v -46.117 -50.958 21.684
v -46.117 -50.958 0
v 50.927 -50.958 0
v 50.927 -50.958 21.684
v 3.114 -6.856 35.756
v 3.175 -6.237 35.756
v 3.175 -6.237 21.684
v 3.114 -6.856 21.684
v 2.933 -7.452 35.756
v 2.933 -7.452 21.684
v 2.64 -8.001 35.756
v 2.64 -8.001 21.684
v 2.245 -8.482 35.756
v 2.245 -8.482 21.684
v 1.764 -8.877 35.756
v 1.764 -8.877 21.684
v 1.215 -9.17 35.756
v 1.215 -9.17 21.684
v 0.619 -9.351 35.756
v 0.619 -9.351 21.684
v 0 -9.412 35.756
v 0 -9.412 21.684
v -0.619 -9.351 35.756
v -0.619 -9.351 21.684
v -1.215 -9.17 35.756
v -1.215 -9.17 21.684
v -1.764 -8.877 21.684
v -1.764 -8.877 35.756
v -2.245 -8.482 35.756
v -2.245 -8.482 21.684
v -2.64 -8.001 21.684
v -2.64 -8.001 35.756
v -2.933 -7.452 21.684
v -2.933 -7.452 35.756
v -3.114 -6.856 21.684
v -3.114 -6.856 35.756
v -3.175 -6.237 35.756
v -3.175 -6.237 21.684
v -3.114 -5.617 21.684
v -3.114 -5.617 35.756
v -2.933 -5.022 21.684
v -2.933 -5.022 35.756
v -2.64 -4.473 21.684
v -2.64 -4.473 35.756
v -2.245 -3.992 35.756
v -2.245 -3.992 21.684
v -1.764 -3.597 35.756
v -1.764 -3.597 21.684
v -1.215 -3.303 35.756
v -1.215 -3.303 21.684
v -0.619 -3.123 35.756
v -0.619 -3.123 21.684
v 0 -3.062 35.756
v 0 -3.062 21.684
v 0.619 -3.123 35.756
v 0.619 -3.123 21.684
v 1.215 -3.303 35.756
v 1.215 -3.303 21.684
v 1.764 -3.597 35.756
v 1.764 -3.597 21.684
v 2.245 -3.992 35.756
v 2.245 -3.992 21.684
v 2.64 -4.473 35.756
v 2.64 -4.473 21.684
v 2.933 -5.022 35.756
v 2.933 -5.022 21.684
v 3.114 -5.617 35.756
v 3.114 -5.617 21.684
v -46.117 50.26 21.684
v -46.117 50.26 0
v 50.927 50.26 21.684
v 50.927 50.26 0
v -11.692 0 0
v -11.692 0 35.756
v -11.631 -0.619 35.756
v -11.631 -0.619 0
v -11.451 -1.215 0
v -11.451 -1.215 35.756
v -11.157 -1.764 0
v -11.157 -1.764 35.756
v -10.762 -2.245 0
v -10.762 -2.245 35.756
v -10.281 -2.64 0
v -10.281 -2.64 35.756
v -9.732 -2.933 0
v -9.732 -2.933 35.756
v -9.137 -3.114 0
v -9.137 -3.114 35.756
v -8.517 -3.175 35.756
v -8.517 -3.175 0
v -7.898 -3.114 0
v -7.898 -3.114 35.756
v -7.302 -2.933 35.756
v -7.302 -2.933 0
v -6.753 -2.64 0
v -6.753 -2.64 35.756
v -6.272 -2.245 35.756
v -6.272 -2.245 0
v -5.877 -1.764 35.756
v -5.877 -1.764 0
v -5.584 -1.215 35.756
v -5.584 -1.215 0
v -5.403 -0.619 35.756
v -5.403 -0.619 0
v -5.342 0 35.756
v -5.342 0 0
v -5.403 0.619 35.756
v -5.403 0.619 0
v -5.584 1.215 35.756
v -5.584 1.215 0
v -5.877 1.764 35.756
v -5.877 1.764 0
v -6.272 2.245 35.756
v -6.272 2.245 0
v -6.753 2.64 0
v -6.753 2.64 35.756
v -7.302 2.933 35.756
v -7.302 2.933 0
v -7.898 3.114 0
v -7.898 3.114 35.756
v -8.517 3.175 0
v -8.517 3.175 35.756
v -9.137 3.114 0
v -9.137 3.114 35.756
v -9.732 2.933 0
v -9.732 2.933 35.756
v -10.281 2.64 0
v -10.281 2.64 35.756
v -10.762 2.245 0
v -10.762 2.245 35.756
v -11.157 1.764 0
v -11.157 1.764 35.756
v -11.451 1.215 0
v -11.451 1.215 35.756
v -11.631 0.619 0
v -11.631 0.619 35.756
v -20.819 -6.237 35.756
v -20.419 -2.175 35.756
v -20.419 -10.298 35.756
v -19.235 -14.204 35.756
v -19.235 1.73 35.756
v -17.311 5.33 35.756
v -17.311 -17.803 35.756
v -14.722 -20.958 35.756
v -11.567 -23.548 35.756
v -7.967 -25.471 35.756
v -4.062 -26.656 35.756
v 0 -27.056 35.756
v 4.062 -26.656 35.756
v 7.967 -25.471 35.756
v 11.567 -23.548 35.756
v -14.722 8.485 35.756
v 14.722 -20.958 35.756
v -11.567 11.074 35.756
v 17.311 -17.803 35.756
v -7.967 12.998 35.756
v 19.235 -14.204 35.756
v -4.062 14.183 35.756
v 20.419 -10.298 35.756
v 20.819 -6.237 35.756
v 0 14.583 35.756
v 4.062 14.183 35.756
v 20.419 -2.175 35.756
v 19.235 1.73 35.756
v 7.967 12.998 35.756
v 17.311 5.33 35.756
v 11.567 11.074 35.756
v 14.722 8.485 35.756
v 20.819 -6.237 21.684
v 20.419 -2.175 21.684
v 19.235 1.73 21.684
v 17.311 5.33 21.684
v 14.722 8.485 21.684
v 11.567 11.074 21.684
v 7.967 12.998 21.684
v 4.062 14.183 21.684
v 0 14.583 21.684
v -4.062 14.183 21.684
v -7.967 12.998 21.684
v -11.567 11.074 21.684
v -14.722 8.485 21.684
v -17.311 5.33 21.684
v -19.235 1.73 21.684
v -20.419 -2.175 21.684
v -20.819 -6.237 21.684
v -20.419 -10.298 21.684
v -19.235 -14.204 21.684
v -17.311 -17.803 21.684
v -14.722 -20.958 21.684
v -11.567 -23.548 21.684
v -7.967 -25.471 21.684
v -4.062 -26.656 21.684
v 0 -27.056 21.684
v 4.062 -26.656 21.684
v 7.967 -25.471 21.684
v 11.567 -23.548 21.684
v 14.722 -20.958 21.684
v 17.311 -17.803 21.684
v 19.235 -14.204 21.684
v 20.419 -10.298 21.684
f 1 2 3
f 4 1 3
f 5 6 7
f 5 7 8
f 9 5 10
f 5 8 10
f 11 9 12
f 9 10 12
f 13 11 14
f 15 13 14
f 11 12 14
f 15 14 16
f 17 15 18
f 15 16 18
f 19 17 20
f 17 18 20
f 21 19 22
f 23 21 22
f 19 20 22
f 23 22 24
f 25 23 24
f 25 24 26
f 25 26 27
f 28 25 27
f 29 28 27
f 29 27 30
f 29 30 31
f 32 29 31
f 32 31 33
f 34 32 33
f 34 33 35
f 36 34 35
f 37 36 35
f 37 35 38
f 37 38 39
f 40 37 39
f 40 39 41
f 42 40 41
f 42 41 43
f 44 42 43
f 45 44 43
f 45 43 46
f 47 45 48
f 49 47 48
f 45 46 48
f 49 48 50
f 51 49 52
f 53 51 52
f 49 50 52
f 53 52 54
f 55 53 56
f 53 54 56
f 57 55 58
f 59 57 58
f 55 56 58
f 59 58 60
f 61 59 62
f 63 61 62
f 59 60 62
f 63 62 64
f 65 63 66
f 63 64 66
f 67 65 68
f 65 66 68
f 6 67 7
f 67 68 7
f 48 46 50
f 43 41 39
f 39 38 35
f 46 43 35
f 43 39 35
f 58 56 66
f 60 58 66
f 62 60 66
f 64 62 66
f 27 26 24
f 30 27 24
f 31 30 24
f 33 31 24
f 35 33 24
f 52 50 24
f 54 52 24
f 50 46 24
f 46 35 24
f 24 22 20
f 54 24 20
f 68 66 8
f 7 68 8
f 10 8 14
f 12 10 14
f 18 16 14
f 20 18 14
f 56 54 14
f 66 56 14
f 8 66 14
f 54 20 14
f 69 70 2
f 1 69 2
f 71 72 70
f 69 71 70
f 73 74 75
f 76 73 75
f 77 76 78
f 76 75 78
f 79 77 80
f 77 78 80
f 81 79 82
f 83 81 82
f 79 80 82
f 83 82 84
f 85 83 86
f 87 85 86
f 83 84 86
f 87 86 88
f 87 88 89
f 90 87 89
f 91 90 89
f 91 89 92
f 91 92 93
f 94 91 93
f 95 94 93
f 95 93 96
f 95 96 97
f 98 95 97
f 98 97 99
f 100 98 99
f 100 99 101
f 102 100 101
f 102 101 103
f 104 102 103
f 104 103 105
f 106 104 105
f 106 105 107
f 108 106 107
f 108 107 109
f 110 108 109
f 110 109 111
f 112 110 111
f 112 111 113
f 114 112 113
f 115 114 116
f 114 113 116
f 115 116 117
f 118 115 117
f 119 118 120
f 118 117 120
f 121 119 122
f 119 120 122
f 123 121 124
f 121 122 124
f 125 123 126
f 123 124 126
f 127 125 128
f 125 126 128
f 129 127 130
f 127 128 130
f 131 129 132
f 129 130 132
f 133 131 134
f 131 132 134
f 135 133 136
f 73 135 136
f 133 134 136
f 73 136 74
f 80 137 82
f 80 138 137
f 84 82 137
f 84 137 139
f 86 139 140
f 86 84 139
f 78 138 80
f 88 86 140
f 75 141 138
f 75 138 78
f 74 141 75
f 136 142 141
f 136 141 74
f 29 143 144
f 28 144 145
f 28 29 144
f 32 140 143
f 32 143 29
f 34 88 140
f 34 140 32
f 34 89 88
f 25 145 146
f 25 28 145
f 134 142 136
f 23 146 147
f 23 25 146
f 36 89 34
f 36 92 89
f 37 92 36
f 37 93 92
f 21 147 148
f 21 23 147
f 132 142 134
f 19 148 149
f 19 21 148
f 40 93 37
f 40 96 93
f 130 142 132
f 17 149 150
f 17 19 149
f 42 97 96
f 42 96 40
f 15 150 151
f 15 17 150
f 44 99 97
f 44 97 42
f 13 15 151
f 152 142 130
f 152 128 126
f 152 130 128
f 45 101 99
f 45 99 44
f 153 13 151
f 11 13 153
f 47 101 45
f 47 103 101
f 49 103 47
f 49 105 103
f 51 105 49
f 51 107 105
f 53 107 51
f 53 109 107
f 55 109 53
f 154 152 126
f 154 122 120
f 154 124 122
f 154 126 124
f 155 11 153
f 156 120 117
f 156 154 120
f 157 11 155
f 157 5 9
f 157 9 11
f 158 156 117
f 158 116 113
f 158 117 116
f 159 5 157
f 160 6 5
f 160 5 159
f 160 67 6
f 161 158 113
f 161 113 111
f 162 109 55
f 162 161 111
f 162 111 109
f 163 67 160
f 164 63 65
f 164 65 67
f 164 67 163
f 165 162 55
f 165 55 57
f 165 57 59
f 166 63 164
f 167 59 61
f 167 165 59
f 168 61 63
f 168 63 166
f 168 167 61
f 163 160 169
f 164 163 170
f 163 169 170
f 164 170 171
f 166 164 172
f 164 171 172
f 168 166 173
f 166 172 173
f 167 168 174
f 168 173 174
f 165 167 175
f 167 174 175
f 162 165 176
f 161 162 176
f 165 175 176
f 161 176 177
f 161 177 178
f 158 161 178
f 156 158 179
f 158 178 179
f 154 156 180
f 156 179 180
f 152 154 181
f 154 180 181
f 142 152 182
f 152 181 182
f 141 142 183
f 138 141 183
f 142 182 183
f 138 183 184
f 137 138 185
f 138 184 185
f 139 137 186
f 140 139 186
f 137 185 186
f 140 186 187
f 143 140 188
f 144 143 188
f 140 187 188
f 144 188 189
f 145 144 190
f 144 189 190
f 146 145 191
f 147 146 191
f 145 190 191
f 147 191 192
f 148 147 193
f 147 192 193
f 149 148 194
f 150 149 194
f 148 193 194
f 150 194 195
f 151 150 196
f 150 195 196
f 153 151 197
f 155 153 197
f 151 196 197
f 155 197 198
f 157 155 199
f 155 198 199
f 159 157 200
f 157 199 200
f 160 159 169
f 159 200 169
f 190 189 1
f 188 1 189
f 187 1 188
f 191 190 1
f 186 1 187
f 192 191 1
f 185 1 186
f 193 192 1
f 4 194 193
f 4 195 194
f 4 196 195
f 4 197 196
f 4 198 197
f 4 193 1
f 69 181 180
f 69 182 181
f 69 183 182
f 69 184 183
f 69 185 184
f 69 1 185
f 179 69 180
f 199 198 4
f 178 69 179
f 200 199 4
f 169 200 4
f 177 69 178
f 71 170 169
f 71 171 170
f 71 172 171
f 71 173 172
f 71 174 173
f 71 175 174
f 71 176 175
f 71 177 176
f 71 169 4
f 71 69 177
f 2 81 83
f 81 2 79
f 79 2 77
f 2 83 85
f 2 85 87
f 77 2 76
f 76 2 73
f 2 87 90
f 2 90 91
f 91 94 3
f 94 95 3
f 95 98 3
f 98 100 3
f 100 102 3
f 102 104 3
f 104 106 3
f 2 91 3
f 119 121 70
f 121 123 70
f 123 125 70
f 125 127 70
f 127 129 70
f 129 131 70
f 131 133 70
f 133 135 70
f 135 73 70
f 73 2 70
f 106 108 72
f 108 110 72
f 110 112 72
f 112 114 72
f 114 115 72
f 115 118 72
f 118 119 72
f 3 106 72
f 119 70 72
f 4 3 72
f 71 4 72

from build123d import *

# Parameters (mm, degrees)
F1_DEPTH   = 21.6836184263
F2_R       = 20.8194643485
F3_DEPTH   = 14.0719488263
F7_D       = 6.35
F7_DEPTH   = 14.0729488263
F7_ON_F6_D = 6.35


# Not quite as in the source:
# - the program builds the solid bodies; features that only make, move or delete a surface that nothing else refers to are left out


with BuildPart() as f1:
    # F0 (on Top) → F1 (new body)
    with BuildSketch(Plane.XY):
        Polygon((50.926592201, 50.2595603466), (-46.1172051728, 50.2595603466), (-46.1172051728, -50.9577989578), (50.926592201, -50.9577989578), (50.926592201, 48.6862957478), align=None)
    extrude(amount=F1_DEPTH)

    # F2 (on face) → F3 (join)
    with BuildSketch(Plane.XY.offset(21.6836184263)):
        with Locations((0, -6.2367771752)):
            Circle(F2_R)
    extrude(amount=F3_DEPTH)

    # F7 (through all, one way)
    with BuildSketch(Plane(origin=(0, 0, 21.6836184263), x_dir=(1, 0, 0), z_dir=(0, 0, -1))):
        with Locations((0, 6.2367771752)):
            Circle(F7_D / 2)
    extrude(amount=-F7_DEPTH, mode=Mode.SUBTRACT)

    # F7 on F6 (through all)
    with Locations(Plane(origin=(0, 0, 0), x_dir=(1, 0, 0), z_dir=(0, 0, -1))):
        with Locations((-8.5173435509, 0)):
            Hole(F7_ON_F6_D / 2)


solid = f1.part
